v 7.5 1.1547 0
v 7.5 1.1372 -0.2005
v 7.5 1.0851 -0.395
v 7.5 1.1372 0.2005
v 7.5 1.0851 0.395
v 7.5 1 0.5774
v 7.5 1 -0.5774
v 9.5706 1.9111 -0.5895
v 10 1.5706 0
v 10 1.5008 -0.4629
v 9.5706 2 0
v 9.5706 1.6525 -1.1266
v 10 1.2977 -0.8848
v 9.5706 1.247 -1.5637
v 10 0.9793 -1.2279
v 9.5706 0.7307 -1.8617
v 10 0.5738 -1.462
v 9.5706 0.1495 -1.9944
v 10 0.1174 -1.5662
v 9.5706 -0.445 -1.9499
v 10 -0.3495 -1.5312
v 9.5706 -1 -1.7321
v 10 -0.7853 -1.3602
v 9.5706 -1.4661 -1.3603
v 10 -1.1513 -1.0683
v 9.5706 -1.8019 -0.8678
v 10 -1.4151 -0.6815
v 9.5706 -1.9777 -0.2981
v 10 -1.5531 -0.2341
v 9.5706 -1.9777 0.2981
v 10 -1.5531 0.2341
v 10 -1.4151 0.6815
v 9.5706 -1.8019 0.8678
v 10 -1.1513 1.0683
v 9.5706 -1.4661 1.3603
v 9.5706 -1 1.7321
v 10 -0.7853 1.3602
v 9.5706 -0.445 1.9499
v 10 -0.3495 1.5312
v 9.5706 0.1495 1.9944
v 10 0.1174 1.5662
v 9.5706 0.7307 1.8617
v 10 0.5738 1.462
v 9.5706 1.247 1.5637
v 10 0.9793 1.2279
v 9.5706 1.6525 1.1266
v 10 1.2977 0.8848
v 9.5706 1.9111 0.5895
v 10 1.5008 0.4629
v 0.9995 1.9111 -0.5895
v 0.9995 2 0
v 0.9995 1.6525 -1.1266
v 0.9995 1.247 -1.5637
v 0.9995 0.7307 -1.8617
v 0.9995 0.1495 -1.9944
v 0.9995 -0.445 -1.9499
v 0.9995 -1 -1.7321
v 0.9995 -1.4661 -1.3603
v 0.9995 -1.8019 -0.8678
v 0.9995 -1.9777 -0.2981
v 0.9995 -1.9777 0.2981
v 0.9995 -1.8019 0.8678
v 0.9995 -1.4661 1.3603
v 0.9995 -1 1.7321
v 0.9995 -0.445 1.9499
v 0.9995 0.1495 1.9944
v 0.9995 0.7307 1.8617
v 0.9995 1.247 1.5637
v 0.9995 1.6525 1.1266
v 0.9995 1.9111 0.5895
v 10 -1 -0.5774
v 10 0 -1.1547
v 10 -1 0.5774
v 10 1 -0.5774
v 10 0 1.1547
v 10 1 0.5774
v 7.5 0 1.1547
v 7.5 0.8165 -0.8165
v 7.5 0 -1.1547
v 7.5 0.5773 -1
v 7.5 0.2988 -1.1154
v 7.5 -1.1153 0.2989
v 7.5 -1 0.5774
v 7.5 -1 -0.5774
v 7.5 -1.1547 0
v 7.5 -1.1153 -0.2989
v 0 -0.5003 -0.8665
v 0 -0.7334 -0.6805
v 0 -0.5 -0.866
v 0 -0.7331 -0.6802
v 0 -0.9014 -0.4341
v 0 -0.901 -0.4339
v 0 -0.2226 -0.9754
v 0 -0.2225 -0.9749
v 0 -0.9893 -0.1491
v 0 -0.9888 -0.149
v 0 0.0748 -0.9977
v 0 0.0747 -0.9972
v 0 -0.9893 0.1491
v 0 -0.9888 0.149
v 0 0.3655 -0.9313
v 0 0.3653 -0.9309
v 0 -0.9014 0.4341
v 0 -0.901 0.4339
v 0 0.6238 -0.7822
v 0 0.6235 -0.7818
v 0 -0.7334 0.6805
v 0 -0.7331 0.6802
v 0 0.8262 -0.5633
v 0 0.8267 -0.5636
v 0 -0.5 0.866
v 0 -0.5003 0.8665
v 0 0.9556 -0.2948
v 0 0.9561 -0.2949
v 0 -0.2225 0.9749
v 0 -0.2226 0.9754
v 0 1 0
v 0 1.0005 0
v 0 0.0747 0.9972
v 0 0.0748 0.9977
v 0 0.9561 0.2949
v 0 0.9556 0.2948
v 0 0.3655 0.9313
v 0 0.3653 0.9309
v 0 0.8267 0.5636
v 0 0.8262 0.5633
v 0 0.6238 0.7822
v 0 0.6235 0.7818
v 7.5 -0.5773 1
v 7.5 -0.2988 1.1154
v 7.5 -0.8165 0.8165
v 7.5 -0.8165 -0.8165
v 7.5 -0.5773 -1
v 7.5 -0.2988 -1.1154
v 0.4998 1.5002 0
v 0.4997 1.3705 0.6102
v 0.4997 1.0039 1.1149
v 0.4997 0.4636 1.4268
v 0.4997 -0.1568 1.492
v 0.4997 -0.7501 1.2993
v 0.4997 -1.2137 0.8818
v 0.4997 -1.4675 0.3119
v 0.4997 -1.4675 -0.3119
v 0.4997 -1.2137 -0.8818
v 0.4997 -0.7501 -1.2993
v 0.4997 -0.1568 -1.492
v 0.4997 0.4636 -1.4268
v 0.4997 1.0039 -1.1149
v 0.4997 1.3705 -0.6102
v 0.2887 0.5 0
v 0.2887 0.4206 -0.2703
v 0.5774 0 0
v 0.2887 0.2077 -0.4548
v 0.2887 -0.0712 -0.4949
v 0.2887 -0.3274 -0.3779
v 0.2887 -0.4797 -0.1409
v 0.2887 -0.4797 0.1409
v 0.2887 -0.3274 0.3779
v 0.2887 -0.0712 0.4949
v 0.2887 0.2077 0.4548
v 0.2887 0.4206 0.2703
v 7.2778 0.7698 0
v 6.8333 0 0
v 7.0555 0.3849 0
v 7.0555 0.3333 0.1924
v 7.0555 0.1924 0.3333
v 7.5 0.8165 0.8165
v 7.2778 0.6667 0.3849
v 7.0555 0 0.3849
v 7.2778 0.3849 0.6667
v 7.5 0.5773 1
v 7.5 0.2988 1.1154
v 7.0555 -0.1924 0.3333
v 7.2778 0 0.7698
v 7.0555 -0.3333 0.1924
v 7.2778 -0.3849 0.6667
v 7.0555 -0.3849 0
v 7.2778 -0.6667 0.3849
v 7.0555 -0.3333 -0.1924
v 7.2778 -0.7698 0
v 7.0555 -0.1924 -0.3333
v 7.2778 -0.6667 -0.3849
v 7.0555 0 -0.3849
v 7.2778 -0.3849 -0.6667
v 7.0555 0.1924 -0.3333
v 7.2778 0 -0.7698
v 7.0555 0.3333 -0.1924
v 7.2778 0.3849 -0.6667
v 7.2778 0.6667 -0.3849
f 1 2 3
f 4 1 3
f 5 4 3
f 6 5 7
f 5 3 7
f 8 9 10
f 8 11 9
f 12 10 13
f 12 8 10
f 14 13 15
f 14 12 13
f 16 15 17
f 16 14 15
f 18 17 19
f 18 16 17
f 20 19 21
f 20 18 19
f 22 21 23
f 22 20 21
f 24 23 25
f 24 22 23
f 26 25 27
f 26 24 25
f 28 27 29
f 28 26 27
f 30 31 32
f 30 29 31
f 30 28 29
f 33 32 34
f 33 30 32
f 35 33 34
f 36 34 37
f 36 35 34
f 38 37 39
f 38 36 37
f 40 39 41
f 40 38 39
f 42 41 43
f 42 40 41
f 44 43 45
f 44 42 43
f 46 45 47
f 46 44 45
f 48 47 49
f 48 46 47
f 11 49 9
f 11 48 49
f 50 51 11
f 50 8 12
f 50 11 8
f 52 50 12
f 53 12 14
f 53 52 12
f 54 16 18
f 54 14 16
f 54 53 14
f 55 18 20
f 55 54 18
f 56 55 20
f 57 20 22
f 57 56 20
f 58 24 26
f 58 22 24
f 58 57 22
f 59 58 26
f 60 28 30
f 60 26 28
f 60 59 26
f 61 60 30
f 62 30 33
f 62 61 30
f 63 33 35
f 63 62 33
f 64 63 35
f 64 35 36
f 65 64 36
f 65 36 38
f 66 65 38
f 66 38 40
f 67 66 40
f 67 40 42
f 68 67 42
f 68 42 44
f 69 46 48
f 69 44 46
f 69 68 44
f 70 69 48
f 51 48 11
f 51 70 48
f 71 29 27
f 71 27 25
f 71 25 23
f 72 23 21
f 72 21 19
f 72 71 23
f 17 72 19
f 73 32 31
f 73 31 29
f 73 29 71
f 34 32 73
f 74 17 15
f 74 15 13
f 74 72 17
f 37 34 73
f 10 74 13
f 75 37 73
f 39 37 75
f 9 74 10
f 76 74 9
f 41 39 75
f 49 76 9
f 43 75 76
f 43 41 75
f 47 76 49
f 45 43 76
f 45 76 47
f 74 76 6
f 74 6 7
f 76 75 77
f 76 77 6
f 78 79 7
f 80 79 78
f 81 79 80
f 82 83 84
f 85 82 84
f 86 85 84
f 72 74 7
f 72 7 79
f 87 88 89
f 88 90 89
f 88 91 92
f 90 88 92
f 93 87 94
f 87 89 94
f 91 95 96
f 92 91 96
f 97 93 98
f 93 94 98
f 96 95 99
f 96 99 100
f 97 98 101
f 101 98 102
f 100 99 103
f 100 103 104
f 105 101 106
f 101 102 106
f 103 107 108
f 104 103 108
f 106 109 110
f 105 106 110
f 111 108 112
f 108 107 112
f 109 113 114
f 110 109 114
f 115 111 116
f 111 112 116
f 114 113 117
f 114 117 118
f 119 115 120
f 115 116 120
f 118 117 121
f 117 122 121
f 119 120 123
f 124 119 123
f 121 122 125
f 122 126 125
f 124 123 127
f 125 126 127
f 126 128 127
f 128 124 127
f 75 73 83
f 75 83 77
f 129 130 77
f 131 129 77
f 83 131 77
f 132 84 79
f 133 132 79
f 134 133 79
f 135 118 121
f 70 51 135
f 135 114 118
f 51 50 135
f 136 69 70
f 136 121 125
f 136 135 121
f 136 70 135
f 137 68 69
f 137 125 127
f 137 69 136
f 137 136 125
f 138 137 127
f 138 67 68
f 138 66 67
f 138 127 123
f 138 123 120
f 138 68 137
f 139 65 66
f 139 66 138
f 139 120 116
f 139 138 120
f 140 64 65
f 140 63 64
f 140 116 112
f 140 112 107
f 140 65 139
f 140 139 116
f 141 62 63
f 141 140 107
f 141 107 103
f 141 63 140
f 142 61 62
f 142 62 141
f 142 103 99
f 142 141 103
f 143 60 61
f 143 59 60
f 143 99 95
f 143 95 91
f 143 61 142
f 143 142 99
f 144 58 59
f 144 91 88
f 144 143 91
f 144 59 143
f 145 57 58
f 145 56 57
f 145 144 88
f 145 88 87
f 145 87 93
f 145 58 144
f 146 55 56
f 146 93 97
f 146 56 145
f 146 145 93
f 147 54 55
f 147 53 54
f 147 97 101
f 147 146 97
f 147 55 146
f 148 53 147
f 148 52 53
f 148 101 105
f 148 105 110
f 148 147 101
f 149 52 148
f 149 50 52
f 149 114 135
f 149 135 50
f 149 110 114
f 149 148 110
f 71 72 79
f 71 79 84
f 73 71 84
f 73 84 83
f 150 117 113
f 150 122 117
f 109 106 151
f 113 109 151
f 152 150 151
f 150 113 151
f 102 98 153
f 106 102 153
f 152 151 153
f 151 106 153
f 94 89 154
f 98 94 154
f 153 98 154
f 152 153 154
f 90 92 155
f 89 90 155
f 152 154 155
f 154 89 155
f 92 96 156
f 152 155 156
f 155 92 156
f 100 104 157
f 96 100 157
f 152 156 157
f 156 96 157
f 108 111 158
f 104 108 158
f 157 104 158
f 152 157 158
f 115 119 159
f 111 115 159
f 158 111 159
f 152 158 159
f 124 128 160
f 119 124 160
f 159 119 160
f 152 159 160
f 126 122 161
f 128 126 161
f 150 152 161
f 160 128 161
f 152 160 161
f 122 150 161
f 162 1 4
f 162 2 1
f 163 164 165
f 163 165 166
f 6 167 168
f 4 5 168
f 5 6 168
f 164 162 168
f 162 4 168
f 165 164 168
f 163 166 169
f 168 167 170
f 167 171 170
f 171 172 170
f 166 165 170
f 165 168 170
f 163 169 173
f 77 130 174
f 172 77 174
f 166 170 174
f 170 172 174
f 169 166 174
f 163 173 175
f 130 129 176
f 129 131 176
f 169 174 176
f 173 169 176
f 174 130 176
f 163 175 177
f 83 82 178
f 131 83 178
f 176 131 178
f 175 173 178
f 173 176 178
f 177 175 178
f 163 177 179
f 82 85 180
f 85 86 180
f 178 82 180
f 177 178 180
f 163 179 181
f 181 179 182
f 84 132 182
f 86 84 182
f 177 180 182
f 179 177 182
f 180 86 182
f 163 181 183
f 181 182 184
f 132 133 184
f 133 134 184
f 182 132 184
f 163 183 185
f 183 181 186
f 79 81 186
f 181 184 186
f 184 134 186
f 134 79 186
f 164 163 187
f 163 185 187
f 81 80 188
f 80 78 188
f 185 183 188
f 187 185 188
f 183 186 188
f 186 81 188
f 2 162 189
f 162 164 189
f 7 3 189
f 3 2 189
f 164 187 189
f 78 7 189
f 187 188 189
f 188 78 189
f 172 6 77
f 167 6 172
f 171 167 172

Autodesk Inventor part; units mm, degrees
ref_plane "YZ Plane" through (0, 0, 0) normal (1, 0, 0) x (0, 1, 0)
ref_plane "XZ Plane" through (0, 0, 0) normal (0, 1, 0) x (-1, 0, 0)
sketch "Skizze1" plane through (0, 0, 0) normal (0, 0, 1) x (1, 0, 0)
  line L0 (0.5774, 0) -> (6.8333, 0)
  line L1 (10, 1.1547) -> (10, 2)
  line L2 (10, 2) -> (0, 2)
  line L3 (10, 1.1547) -> (7.5, 1.1547)
  line L4 (7.5, 1.1547) -> (6.8333, 0)
  line L5 (0, 1) -> (0.5774, 0)
  line L6 (0, -0.4) -> (0, 2.4) projected
  line L7 (0, 1) -> (0, 2)
  point P0 (0, 0)
  dimension "d0" = 2.5
  dimension "d1" = 60
  dimension "d2" = 4
  dimension "d3" = 2.3094
  dimension "d4" = 10
  dimension "d5" = 60
  dimension "d7" = 2
revolve "Körper" add sketch "Skizze1" angle 360 about axis through (0.5774, 0, 0) along (1, 0, 0)
sketch "Skizze2" plane through (10, 0, 0) normal (1, 0, 0) x (0, 0, -1)
  circle A0 centre (0, 0) radius 1.1547 projected
  circle A1 centre (0, 0) radius 2 projected
  line L0 (1.1547, 0) -> (0.5774, -1)
  line L1 (0.5774, -1) -> (-0.5774, -1)
  line L2 (-0.5774, -1) -> (-1.1547, 0)
  line L3 (-1.1547, 0) -> (-0.5774, 1)
  line L4 (-0.5774, 1) -> (0.5774, 1)
  line L5 (0.5774, 1) -> (1.1547, 0)
extrude "Loch" add sketch "Skizze2" against normal blind 2.5 contours L5 A0 | A0 L0 | L4 A0 | A0 L1 | L3 A0 | A0 L2
chamfer "Fase1" distance 1 angle 45 1 edges at (0, -2, 0) measured on face at (0, 1.6473, -0.1595)
thread "Gewinde" size "M4x0.7" class "6g" standard "ISO Metric profile" length 10
chamfer "Fase2" distance 0.4294 angle 45 1 edges at (10, -2, 0) measured on face at (6.9998, 1.9741, -0.3208)
ref_plane "Work Plane1" through (5, 0, 0) normal (0, -0.5, -0.866) x (1, 0, 0)
equation "\"d0\" = INTI"
equation "\"d2\" = NND"
equation "\"d3\" = 1.1547 * SW"
equation "\"d4\" = NLG"
equation "\"d5\" = 0.5 * ANG"
equation "\"d7\" = SPD"
equation "\"d8\" = INTI"
equation "\"d10\" = -0.5 * SPD + 0.5 * NND"
equation "\"d11\" = FAWI"
equation "\"d33\" = -0.5 * SPD + 0.5 * NND"
equation "\"d14\" = NLG"
equation "\"d12\" = -0.5 * GD1 + 0.5 * NND"
equation "\"d13\" = FAWI"
equation "\"d34\" = -0.5 * GD1 + 0.5 * NND"
equation "\"NND\" = 4"
equation "\"NLG\" = 10"
equation "\"INTI\" = 2.5"
equation "\"FAWI\" = 45deg"
equation "\"SW\" = 2"
equation "\"GD1\" = THREADDIA - 1.2269 * PTC"
equation "\"ANG\" = 120deg"
equation "\"FAWI1\" = 45deg"
equation "\"SPD\" = 2"
equation "\"GUL\" = 0.61345 * PTC"
equation "\"TOA\" = 30deg"
equation "\"THREADDIA\" = 4"
equation "\"PTC\" = 0.7"
equation "\"GAL\" = 0.61345 * PTC"
equation "\"E0\" = 1.155 * SW"
properties part number "ISO 4029 - M4 x 10" material "Edelstahl, 440C"
